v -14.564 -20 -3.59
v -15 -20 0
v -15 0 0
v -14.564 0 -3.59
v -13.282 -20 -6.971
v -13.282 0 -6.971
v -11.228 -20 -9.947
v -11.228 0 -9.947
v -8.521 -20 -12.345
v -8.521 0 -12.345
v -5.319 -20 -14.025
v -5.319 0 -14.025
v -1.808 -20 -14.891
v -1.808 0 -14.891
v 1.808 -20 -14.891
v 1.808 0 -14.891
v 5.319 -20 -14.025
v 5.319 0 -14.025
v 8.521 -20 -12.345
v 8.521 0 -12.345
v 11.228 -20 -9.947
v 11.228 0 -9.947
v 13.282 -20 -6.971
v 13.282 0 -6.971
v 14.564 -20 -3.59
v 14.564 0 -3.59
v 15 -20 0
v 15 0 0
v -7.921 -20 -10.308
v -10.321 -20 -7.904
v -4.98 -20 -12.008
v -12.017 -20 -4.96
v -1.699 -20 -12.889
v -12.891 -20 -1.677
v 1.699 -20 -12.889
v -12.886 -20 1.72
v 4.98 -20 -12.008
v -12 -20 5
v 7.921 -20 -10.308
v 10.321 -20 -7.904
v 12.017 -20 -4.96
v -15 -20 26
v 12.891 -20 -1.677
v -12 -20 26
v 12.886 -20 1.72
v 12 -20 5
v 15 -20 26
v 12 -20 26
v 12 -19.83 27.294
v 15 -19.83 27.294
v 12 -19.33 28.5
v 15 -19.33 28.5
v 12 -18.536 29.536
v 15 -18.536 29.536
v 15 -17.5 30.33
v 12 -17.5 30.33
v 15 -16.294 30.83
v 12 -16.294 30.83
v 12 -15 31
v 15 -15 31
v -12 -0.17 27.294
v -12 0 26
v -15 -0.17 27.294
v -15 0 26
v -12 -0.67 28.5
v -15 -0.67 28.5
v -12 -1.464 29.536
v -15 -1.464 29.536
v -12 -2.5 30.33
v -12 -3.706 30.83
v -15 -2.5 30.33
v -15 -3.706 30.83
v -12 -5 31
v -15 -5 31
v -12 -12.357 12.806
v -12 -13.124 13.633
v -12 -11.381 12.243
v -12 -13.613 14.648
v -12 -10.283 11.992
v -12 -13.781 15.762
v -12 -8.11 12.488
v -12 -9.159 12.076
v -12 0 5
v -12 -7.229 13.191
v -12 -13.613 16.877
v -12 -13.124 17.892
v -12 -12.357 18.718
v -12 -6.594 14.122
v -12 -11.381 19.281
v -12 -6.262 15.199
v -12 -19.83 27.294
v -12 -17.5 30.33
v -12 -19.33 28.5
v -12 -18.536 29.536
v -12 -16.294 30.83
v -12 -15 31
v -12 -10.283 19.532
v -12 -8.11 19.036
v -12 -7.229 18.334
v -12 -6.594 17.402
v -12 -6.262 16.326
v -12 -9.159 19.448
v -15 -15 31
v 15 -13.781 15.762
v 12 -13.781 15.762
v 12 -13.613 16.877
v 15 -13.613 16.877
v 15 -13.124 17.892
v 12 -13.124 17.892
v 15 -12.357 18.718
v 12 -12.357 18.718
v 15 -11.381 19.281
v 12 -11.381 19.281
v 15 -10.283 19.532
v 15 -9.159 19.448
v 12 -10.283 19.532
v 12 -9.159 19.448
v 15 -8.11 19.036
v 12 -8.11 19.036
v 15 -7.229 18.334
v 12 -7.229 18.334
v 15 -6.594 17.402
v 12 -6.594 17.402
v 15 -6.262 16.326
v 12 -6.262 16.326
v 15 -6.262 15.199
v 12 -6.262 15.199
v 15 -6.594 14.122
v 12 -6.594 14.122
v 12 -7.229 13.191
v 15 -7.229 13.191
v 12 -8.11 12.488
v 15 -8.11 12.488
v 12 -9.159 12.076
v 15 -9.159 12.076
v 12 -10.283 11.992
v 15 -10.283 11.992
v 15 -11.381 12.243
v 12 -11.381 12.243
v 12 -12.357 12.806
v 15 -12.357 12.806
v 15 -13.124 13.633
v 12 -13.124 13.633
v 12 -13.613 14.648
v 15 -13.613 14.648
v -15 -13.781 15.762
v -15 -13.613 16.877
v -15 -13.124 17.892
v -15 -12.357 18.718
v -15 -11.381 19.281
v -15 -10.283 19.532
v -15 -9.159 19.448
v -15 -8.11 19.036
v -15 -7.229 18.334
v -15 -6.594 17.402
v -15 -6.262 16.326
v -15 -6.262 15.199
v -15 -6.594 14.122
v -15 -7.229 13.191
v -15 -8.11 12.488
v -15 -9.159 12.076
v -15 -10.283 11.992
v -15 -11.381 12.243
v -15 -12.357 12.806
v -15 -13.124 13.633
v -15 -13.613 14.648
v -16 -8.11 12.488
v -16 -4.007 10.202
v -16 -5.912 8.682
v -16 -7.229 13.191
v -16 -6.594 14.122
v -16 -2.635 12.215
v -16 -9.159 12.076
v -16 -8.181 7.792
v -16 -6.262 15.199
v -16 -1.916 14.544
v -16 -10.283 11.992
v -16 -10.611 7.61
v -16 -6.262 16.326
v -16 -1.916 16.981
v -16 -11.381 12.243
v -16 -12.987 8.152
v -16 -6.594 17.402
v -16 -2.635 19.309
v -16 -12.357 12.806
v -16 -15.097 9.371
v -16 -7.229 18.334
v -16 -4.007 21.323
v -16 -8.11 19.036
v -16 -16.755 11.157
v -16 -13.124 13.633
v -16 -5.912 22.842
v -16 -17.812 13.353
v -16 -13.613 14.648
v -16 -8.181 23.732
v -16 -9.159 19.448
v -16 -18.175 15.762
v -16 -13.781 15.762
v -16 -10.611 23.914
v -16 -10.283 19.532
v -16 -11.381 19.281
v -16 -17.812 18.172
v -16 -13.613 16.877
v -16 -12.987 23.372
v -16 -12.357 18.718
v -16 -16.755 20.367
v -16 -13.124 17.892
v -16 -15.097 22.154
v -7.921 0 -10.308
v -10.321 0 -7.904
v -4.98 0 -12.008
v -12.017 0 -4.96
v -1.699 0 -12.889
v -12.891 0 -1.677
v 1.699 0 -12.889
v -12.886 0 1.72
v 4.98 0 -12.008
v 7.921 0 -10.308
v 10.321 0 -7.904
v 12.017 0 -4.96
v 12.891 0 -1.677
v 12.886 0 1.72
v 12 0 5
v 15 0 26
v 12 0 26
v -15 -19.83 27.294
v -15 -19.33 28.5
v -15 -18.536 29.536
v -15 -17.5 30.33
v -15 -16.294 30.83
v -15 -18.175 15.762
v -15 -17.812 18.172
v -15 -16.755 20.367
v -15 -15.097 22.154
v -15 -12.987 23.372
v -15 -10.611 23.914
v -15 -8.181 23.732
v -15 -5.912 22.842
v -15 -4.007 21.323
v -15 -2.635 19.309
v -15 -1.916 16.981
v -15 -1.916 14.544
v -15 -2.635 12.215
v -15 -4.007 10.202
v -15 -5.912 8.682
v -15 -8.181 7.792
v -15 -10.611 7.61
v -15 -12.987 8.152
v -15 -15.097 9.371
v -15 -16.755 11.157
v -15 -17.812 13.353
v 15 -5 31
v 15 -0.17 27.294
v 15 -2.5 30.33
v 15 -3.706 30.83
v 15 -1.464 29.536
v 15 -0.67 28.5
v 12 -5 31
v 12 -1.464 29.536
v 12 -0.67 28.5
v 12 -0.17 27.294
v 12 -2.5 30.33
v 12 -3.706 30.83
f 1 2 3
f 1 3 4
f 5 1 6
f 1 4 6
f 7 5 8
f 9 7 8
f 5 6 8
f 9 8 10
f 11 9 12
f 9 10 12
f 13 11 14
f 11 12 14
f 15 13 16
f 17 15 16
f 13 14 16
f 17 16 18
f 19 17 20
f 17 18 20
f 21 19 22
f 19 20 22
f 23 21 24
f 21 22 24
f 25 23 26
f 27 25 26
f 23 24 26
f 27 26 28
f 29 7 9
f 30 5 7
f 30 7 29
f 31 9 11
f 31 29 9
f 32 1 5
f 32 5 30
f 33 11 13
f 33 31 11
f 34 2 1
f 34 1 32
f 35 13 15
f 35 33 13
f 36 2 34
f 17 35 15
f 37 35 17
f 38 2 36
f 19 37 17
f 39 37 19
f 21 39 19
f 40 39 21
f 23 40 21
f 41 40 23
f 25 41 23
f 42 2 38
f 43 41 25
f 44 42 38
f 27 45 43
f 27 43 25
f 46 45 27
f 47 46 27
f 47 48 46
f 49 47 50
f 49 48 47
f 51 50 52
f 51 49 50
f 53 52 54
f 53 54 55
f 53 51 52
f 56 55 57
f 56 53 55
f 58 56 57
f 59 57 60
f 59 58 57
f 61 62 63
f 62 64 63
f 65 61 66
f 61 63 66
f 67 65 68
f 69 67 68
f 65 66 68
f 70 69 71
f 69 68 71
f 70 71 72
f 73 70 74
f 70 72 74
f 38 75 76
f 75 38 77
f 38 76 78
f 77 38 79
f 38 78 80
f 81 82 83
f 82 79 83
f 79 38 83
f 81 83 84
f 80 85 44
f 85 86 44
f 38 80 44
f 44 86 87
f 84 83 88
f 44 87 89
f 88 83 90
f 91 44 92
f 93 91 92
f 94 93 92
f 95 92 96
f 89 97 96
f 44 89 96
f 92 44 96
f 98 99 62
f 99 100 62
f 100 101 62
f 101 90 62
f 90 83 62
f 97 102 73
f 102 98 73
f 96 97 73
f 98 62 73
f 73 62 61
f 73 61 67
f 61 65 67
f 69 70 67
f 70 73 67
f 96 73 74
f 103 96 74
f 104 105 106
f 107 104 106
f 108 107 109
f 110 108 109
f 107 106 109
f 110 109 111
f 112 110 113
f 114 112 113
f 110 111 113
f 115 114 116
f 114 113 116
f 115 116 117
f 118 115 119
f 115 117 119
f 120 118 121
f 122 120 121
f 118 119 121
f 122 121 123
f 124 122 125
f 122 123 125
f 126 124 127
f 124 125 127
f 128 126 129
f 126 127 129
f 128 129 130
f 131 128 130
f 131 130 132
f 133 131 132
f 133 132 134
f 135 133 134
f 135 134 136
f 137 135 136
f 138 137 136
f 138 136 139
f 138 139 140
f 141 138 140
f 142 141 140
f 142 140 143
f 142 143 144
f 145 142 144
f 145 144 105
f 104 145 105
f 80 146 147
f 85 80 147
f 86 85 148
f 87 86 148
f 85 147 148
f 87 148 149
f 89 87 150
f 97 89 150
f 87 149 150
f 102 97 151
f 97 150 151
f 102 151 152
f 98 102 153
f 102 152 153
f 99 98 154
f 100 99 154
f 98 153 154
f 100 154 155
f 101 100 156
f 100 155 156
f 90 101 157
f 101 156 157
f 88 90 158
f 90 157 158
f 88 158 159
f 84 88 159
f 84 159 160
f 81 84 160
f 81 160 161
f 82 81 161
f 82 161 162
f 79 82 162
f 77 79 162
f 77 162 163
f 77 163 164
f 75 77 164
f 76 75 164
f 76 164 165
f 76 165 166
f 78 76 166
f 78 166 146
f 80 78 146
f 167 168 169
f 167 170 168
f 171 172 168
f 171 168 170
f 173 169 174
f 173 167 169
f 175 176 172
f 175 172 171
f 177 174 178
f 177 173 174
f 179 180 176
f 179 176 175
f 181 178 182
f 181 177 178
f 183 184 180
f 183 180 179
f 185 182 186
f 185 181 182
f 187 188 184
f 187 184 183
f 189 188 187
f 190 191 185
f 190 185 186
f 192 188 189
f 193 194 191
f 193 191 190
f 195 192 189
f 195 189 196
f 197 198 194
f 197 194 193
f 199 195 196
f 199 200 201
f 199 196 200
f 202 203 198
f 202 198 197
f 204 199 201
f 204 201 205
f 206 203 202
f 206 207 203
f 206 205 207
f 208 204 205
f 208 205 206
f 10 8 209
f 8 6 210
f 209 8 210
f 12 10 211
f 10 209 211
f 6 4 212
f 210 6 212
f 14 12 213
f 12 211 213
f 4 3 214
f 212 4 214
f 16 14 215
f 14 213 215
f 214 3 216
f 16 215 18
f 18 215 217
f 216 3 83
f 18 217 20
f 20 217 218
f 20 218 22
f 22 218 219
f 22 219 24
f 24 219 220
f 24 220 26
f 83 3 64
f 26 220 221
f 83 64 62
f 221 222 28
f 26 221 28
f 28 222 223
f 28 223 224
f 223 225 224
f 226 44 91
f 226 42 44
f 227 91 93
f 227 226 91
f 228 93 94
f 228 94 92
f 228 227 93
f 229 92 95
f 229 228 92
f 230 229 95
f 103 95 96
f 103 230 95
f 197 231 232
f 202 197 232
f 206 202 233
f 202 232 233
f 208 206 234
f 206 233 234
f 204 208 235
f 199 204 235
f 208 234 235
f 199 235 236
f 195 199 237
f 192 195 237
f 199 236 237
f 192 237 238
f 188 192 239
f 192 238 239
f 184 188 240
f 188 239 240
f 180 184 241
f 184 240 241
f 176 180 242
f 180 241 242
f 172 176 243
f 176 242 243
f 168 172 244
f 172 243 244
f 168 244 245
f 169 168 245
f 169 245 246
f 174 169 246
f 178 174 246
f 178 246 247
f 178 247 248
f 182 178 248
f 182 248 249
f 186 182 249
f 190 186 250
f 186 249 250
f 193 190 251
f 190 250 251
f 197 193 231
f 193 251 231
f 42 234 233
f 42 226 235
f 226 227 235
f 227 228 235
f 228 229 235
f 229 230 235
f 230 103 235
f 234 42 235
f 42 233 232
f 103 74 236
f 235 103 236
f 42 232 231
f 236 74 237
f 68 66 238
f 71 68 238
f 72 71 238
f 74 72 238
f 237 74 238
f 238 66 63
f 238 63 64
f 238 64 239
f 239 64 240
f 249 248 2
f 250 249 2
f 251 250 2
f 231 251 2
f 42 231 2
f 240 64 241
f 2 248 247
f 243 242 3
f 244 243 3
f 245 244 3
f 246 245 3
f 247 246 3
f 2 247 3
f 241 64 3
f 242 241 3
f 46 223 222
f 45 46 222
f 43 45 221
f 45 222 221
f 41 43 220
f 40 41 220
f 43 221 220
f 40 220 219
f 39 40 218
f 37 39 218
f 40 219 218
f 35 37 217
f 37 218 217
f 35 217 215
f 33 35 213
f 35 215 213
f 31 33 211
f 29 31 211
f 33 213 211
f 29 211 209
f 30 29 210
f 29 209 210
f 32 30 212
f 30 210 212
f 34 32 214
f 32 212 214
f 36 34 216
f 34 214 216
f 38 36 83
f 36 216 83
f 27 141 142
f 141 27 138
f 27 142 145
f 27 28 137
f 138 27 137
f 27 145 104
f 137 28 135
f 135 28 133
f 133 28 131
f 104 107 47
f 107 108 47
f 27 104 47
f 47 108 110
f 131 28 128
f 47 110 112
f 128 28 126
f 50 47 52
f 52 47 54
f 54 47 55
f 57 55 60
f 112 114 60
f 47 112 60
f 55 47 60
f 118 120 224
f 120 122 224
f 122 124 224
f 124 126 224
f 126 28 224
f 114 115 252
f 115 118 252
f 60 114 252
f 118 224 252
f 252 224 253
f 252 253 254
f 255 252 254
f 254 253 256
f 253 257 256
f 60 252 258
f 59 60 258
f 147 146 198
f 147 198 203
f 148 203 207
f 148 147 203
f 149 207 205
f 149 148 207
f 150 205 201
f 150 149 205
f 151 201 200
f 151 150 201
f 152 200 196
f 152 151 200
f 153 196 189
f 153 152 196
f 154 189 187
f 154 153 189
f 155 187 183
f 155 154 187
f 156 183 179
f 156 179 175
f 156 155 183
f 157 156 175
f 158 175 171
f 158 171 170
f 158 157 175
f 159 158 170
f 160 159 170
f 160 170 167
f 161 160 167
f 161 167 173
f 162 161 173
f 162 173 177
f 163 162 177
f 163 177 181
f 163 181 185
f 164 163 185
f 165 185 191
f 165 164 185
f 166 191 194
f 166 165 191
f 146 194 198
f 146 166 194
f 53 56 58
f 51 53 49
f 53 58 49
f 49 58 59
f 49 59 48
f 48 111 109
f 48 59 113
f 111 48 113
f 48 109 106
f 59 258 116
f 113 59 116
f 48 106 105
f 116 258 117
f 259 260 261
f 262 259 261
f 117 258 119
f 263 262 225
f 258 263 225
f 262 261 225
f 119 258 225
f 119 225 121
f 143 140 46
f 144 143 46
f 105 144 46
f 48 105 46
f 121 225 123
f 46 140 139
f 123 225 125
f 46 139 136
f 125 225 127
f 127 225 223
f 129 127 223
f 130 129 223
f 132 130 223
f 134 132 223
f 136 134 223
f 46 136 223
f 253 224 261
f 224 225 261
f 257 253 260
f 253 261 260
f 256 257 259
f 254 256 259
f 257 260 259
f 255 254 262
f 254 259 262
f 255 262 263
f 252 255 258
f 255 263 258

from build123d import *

# Parameters (mm, degrees)
F1_DEPTH  = 20
F2_R      = 8.175018
F2_R_2    = 3.780512
F3_DEPTH  = 1
F3_FACE_R = 3.780512
F4_DEPTH  = 47.6
F5_R      = 5


with BuildPart() as f1:
    # F0 (on Front) → F1 (new body)
    with BuildSketch(Plane.XZ):
        with BuildLine():
            ThreePointArc((12, 5), (0, -13), (-12, 5))
            Line((-12, 5), (-12, 31))
            Line((-12, 31), (-15, 31))
            Line((-15, 31), (-15, 0))
            ThreePointArc((-15, 0), (0, -15), (15, 0))
            Line((15, 0), (15, 31))
            Line((15, 31), (12, 31))
            Line((12, 31), (12, 5))
        make_face()
    extrude(amount=F1_DEPTH)

    # F2 (on face) → F3 (join)
    with BuildSketch(Plane(origin=(-15, 0, 0), x_dir=(0, -1, 0), z_dir=(-1, 0, 0))):
        with Locations((10, 15.762184)):
            Circle(F2_R)
        with Locations((10, 15.762184)):
            Circle(F2_R_2, mode=Mode.SUBTRACT)
    extrude(amount=F3_DEPTH)

    # F3_face (on face) → F4 (cut)
    with BuildSketch(Plane(origin=(-15, -10, 15.762184), x_dir=(0, -1, 0), z_dir=(-1, 0, 0))):
        Circle(F3_FACE_R)
    extrude(amount=-F4_DEPTH, mode=Mode.SUBTRACT)

    # F5
    f5_edges = [f1.edges().sort_by_distance(p)[0] for p in [
        (-13.5, -20, 31),
        (-13.5, 0, 31),
        (13.5, -20, 31),
        (13.5, 0, 31),
    ]]
    fillet(f5_edges, radius=F5_R)


solid = f1.part
